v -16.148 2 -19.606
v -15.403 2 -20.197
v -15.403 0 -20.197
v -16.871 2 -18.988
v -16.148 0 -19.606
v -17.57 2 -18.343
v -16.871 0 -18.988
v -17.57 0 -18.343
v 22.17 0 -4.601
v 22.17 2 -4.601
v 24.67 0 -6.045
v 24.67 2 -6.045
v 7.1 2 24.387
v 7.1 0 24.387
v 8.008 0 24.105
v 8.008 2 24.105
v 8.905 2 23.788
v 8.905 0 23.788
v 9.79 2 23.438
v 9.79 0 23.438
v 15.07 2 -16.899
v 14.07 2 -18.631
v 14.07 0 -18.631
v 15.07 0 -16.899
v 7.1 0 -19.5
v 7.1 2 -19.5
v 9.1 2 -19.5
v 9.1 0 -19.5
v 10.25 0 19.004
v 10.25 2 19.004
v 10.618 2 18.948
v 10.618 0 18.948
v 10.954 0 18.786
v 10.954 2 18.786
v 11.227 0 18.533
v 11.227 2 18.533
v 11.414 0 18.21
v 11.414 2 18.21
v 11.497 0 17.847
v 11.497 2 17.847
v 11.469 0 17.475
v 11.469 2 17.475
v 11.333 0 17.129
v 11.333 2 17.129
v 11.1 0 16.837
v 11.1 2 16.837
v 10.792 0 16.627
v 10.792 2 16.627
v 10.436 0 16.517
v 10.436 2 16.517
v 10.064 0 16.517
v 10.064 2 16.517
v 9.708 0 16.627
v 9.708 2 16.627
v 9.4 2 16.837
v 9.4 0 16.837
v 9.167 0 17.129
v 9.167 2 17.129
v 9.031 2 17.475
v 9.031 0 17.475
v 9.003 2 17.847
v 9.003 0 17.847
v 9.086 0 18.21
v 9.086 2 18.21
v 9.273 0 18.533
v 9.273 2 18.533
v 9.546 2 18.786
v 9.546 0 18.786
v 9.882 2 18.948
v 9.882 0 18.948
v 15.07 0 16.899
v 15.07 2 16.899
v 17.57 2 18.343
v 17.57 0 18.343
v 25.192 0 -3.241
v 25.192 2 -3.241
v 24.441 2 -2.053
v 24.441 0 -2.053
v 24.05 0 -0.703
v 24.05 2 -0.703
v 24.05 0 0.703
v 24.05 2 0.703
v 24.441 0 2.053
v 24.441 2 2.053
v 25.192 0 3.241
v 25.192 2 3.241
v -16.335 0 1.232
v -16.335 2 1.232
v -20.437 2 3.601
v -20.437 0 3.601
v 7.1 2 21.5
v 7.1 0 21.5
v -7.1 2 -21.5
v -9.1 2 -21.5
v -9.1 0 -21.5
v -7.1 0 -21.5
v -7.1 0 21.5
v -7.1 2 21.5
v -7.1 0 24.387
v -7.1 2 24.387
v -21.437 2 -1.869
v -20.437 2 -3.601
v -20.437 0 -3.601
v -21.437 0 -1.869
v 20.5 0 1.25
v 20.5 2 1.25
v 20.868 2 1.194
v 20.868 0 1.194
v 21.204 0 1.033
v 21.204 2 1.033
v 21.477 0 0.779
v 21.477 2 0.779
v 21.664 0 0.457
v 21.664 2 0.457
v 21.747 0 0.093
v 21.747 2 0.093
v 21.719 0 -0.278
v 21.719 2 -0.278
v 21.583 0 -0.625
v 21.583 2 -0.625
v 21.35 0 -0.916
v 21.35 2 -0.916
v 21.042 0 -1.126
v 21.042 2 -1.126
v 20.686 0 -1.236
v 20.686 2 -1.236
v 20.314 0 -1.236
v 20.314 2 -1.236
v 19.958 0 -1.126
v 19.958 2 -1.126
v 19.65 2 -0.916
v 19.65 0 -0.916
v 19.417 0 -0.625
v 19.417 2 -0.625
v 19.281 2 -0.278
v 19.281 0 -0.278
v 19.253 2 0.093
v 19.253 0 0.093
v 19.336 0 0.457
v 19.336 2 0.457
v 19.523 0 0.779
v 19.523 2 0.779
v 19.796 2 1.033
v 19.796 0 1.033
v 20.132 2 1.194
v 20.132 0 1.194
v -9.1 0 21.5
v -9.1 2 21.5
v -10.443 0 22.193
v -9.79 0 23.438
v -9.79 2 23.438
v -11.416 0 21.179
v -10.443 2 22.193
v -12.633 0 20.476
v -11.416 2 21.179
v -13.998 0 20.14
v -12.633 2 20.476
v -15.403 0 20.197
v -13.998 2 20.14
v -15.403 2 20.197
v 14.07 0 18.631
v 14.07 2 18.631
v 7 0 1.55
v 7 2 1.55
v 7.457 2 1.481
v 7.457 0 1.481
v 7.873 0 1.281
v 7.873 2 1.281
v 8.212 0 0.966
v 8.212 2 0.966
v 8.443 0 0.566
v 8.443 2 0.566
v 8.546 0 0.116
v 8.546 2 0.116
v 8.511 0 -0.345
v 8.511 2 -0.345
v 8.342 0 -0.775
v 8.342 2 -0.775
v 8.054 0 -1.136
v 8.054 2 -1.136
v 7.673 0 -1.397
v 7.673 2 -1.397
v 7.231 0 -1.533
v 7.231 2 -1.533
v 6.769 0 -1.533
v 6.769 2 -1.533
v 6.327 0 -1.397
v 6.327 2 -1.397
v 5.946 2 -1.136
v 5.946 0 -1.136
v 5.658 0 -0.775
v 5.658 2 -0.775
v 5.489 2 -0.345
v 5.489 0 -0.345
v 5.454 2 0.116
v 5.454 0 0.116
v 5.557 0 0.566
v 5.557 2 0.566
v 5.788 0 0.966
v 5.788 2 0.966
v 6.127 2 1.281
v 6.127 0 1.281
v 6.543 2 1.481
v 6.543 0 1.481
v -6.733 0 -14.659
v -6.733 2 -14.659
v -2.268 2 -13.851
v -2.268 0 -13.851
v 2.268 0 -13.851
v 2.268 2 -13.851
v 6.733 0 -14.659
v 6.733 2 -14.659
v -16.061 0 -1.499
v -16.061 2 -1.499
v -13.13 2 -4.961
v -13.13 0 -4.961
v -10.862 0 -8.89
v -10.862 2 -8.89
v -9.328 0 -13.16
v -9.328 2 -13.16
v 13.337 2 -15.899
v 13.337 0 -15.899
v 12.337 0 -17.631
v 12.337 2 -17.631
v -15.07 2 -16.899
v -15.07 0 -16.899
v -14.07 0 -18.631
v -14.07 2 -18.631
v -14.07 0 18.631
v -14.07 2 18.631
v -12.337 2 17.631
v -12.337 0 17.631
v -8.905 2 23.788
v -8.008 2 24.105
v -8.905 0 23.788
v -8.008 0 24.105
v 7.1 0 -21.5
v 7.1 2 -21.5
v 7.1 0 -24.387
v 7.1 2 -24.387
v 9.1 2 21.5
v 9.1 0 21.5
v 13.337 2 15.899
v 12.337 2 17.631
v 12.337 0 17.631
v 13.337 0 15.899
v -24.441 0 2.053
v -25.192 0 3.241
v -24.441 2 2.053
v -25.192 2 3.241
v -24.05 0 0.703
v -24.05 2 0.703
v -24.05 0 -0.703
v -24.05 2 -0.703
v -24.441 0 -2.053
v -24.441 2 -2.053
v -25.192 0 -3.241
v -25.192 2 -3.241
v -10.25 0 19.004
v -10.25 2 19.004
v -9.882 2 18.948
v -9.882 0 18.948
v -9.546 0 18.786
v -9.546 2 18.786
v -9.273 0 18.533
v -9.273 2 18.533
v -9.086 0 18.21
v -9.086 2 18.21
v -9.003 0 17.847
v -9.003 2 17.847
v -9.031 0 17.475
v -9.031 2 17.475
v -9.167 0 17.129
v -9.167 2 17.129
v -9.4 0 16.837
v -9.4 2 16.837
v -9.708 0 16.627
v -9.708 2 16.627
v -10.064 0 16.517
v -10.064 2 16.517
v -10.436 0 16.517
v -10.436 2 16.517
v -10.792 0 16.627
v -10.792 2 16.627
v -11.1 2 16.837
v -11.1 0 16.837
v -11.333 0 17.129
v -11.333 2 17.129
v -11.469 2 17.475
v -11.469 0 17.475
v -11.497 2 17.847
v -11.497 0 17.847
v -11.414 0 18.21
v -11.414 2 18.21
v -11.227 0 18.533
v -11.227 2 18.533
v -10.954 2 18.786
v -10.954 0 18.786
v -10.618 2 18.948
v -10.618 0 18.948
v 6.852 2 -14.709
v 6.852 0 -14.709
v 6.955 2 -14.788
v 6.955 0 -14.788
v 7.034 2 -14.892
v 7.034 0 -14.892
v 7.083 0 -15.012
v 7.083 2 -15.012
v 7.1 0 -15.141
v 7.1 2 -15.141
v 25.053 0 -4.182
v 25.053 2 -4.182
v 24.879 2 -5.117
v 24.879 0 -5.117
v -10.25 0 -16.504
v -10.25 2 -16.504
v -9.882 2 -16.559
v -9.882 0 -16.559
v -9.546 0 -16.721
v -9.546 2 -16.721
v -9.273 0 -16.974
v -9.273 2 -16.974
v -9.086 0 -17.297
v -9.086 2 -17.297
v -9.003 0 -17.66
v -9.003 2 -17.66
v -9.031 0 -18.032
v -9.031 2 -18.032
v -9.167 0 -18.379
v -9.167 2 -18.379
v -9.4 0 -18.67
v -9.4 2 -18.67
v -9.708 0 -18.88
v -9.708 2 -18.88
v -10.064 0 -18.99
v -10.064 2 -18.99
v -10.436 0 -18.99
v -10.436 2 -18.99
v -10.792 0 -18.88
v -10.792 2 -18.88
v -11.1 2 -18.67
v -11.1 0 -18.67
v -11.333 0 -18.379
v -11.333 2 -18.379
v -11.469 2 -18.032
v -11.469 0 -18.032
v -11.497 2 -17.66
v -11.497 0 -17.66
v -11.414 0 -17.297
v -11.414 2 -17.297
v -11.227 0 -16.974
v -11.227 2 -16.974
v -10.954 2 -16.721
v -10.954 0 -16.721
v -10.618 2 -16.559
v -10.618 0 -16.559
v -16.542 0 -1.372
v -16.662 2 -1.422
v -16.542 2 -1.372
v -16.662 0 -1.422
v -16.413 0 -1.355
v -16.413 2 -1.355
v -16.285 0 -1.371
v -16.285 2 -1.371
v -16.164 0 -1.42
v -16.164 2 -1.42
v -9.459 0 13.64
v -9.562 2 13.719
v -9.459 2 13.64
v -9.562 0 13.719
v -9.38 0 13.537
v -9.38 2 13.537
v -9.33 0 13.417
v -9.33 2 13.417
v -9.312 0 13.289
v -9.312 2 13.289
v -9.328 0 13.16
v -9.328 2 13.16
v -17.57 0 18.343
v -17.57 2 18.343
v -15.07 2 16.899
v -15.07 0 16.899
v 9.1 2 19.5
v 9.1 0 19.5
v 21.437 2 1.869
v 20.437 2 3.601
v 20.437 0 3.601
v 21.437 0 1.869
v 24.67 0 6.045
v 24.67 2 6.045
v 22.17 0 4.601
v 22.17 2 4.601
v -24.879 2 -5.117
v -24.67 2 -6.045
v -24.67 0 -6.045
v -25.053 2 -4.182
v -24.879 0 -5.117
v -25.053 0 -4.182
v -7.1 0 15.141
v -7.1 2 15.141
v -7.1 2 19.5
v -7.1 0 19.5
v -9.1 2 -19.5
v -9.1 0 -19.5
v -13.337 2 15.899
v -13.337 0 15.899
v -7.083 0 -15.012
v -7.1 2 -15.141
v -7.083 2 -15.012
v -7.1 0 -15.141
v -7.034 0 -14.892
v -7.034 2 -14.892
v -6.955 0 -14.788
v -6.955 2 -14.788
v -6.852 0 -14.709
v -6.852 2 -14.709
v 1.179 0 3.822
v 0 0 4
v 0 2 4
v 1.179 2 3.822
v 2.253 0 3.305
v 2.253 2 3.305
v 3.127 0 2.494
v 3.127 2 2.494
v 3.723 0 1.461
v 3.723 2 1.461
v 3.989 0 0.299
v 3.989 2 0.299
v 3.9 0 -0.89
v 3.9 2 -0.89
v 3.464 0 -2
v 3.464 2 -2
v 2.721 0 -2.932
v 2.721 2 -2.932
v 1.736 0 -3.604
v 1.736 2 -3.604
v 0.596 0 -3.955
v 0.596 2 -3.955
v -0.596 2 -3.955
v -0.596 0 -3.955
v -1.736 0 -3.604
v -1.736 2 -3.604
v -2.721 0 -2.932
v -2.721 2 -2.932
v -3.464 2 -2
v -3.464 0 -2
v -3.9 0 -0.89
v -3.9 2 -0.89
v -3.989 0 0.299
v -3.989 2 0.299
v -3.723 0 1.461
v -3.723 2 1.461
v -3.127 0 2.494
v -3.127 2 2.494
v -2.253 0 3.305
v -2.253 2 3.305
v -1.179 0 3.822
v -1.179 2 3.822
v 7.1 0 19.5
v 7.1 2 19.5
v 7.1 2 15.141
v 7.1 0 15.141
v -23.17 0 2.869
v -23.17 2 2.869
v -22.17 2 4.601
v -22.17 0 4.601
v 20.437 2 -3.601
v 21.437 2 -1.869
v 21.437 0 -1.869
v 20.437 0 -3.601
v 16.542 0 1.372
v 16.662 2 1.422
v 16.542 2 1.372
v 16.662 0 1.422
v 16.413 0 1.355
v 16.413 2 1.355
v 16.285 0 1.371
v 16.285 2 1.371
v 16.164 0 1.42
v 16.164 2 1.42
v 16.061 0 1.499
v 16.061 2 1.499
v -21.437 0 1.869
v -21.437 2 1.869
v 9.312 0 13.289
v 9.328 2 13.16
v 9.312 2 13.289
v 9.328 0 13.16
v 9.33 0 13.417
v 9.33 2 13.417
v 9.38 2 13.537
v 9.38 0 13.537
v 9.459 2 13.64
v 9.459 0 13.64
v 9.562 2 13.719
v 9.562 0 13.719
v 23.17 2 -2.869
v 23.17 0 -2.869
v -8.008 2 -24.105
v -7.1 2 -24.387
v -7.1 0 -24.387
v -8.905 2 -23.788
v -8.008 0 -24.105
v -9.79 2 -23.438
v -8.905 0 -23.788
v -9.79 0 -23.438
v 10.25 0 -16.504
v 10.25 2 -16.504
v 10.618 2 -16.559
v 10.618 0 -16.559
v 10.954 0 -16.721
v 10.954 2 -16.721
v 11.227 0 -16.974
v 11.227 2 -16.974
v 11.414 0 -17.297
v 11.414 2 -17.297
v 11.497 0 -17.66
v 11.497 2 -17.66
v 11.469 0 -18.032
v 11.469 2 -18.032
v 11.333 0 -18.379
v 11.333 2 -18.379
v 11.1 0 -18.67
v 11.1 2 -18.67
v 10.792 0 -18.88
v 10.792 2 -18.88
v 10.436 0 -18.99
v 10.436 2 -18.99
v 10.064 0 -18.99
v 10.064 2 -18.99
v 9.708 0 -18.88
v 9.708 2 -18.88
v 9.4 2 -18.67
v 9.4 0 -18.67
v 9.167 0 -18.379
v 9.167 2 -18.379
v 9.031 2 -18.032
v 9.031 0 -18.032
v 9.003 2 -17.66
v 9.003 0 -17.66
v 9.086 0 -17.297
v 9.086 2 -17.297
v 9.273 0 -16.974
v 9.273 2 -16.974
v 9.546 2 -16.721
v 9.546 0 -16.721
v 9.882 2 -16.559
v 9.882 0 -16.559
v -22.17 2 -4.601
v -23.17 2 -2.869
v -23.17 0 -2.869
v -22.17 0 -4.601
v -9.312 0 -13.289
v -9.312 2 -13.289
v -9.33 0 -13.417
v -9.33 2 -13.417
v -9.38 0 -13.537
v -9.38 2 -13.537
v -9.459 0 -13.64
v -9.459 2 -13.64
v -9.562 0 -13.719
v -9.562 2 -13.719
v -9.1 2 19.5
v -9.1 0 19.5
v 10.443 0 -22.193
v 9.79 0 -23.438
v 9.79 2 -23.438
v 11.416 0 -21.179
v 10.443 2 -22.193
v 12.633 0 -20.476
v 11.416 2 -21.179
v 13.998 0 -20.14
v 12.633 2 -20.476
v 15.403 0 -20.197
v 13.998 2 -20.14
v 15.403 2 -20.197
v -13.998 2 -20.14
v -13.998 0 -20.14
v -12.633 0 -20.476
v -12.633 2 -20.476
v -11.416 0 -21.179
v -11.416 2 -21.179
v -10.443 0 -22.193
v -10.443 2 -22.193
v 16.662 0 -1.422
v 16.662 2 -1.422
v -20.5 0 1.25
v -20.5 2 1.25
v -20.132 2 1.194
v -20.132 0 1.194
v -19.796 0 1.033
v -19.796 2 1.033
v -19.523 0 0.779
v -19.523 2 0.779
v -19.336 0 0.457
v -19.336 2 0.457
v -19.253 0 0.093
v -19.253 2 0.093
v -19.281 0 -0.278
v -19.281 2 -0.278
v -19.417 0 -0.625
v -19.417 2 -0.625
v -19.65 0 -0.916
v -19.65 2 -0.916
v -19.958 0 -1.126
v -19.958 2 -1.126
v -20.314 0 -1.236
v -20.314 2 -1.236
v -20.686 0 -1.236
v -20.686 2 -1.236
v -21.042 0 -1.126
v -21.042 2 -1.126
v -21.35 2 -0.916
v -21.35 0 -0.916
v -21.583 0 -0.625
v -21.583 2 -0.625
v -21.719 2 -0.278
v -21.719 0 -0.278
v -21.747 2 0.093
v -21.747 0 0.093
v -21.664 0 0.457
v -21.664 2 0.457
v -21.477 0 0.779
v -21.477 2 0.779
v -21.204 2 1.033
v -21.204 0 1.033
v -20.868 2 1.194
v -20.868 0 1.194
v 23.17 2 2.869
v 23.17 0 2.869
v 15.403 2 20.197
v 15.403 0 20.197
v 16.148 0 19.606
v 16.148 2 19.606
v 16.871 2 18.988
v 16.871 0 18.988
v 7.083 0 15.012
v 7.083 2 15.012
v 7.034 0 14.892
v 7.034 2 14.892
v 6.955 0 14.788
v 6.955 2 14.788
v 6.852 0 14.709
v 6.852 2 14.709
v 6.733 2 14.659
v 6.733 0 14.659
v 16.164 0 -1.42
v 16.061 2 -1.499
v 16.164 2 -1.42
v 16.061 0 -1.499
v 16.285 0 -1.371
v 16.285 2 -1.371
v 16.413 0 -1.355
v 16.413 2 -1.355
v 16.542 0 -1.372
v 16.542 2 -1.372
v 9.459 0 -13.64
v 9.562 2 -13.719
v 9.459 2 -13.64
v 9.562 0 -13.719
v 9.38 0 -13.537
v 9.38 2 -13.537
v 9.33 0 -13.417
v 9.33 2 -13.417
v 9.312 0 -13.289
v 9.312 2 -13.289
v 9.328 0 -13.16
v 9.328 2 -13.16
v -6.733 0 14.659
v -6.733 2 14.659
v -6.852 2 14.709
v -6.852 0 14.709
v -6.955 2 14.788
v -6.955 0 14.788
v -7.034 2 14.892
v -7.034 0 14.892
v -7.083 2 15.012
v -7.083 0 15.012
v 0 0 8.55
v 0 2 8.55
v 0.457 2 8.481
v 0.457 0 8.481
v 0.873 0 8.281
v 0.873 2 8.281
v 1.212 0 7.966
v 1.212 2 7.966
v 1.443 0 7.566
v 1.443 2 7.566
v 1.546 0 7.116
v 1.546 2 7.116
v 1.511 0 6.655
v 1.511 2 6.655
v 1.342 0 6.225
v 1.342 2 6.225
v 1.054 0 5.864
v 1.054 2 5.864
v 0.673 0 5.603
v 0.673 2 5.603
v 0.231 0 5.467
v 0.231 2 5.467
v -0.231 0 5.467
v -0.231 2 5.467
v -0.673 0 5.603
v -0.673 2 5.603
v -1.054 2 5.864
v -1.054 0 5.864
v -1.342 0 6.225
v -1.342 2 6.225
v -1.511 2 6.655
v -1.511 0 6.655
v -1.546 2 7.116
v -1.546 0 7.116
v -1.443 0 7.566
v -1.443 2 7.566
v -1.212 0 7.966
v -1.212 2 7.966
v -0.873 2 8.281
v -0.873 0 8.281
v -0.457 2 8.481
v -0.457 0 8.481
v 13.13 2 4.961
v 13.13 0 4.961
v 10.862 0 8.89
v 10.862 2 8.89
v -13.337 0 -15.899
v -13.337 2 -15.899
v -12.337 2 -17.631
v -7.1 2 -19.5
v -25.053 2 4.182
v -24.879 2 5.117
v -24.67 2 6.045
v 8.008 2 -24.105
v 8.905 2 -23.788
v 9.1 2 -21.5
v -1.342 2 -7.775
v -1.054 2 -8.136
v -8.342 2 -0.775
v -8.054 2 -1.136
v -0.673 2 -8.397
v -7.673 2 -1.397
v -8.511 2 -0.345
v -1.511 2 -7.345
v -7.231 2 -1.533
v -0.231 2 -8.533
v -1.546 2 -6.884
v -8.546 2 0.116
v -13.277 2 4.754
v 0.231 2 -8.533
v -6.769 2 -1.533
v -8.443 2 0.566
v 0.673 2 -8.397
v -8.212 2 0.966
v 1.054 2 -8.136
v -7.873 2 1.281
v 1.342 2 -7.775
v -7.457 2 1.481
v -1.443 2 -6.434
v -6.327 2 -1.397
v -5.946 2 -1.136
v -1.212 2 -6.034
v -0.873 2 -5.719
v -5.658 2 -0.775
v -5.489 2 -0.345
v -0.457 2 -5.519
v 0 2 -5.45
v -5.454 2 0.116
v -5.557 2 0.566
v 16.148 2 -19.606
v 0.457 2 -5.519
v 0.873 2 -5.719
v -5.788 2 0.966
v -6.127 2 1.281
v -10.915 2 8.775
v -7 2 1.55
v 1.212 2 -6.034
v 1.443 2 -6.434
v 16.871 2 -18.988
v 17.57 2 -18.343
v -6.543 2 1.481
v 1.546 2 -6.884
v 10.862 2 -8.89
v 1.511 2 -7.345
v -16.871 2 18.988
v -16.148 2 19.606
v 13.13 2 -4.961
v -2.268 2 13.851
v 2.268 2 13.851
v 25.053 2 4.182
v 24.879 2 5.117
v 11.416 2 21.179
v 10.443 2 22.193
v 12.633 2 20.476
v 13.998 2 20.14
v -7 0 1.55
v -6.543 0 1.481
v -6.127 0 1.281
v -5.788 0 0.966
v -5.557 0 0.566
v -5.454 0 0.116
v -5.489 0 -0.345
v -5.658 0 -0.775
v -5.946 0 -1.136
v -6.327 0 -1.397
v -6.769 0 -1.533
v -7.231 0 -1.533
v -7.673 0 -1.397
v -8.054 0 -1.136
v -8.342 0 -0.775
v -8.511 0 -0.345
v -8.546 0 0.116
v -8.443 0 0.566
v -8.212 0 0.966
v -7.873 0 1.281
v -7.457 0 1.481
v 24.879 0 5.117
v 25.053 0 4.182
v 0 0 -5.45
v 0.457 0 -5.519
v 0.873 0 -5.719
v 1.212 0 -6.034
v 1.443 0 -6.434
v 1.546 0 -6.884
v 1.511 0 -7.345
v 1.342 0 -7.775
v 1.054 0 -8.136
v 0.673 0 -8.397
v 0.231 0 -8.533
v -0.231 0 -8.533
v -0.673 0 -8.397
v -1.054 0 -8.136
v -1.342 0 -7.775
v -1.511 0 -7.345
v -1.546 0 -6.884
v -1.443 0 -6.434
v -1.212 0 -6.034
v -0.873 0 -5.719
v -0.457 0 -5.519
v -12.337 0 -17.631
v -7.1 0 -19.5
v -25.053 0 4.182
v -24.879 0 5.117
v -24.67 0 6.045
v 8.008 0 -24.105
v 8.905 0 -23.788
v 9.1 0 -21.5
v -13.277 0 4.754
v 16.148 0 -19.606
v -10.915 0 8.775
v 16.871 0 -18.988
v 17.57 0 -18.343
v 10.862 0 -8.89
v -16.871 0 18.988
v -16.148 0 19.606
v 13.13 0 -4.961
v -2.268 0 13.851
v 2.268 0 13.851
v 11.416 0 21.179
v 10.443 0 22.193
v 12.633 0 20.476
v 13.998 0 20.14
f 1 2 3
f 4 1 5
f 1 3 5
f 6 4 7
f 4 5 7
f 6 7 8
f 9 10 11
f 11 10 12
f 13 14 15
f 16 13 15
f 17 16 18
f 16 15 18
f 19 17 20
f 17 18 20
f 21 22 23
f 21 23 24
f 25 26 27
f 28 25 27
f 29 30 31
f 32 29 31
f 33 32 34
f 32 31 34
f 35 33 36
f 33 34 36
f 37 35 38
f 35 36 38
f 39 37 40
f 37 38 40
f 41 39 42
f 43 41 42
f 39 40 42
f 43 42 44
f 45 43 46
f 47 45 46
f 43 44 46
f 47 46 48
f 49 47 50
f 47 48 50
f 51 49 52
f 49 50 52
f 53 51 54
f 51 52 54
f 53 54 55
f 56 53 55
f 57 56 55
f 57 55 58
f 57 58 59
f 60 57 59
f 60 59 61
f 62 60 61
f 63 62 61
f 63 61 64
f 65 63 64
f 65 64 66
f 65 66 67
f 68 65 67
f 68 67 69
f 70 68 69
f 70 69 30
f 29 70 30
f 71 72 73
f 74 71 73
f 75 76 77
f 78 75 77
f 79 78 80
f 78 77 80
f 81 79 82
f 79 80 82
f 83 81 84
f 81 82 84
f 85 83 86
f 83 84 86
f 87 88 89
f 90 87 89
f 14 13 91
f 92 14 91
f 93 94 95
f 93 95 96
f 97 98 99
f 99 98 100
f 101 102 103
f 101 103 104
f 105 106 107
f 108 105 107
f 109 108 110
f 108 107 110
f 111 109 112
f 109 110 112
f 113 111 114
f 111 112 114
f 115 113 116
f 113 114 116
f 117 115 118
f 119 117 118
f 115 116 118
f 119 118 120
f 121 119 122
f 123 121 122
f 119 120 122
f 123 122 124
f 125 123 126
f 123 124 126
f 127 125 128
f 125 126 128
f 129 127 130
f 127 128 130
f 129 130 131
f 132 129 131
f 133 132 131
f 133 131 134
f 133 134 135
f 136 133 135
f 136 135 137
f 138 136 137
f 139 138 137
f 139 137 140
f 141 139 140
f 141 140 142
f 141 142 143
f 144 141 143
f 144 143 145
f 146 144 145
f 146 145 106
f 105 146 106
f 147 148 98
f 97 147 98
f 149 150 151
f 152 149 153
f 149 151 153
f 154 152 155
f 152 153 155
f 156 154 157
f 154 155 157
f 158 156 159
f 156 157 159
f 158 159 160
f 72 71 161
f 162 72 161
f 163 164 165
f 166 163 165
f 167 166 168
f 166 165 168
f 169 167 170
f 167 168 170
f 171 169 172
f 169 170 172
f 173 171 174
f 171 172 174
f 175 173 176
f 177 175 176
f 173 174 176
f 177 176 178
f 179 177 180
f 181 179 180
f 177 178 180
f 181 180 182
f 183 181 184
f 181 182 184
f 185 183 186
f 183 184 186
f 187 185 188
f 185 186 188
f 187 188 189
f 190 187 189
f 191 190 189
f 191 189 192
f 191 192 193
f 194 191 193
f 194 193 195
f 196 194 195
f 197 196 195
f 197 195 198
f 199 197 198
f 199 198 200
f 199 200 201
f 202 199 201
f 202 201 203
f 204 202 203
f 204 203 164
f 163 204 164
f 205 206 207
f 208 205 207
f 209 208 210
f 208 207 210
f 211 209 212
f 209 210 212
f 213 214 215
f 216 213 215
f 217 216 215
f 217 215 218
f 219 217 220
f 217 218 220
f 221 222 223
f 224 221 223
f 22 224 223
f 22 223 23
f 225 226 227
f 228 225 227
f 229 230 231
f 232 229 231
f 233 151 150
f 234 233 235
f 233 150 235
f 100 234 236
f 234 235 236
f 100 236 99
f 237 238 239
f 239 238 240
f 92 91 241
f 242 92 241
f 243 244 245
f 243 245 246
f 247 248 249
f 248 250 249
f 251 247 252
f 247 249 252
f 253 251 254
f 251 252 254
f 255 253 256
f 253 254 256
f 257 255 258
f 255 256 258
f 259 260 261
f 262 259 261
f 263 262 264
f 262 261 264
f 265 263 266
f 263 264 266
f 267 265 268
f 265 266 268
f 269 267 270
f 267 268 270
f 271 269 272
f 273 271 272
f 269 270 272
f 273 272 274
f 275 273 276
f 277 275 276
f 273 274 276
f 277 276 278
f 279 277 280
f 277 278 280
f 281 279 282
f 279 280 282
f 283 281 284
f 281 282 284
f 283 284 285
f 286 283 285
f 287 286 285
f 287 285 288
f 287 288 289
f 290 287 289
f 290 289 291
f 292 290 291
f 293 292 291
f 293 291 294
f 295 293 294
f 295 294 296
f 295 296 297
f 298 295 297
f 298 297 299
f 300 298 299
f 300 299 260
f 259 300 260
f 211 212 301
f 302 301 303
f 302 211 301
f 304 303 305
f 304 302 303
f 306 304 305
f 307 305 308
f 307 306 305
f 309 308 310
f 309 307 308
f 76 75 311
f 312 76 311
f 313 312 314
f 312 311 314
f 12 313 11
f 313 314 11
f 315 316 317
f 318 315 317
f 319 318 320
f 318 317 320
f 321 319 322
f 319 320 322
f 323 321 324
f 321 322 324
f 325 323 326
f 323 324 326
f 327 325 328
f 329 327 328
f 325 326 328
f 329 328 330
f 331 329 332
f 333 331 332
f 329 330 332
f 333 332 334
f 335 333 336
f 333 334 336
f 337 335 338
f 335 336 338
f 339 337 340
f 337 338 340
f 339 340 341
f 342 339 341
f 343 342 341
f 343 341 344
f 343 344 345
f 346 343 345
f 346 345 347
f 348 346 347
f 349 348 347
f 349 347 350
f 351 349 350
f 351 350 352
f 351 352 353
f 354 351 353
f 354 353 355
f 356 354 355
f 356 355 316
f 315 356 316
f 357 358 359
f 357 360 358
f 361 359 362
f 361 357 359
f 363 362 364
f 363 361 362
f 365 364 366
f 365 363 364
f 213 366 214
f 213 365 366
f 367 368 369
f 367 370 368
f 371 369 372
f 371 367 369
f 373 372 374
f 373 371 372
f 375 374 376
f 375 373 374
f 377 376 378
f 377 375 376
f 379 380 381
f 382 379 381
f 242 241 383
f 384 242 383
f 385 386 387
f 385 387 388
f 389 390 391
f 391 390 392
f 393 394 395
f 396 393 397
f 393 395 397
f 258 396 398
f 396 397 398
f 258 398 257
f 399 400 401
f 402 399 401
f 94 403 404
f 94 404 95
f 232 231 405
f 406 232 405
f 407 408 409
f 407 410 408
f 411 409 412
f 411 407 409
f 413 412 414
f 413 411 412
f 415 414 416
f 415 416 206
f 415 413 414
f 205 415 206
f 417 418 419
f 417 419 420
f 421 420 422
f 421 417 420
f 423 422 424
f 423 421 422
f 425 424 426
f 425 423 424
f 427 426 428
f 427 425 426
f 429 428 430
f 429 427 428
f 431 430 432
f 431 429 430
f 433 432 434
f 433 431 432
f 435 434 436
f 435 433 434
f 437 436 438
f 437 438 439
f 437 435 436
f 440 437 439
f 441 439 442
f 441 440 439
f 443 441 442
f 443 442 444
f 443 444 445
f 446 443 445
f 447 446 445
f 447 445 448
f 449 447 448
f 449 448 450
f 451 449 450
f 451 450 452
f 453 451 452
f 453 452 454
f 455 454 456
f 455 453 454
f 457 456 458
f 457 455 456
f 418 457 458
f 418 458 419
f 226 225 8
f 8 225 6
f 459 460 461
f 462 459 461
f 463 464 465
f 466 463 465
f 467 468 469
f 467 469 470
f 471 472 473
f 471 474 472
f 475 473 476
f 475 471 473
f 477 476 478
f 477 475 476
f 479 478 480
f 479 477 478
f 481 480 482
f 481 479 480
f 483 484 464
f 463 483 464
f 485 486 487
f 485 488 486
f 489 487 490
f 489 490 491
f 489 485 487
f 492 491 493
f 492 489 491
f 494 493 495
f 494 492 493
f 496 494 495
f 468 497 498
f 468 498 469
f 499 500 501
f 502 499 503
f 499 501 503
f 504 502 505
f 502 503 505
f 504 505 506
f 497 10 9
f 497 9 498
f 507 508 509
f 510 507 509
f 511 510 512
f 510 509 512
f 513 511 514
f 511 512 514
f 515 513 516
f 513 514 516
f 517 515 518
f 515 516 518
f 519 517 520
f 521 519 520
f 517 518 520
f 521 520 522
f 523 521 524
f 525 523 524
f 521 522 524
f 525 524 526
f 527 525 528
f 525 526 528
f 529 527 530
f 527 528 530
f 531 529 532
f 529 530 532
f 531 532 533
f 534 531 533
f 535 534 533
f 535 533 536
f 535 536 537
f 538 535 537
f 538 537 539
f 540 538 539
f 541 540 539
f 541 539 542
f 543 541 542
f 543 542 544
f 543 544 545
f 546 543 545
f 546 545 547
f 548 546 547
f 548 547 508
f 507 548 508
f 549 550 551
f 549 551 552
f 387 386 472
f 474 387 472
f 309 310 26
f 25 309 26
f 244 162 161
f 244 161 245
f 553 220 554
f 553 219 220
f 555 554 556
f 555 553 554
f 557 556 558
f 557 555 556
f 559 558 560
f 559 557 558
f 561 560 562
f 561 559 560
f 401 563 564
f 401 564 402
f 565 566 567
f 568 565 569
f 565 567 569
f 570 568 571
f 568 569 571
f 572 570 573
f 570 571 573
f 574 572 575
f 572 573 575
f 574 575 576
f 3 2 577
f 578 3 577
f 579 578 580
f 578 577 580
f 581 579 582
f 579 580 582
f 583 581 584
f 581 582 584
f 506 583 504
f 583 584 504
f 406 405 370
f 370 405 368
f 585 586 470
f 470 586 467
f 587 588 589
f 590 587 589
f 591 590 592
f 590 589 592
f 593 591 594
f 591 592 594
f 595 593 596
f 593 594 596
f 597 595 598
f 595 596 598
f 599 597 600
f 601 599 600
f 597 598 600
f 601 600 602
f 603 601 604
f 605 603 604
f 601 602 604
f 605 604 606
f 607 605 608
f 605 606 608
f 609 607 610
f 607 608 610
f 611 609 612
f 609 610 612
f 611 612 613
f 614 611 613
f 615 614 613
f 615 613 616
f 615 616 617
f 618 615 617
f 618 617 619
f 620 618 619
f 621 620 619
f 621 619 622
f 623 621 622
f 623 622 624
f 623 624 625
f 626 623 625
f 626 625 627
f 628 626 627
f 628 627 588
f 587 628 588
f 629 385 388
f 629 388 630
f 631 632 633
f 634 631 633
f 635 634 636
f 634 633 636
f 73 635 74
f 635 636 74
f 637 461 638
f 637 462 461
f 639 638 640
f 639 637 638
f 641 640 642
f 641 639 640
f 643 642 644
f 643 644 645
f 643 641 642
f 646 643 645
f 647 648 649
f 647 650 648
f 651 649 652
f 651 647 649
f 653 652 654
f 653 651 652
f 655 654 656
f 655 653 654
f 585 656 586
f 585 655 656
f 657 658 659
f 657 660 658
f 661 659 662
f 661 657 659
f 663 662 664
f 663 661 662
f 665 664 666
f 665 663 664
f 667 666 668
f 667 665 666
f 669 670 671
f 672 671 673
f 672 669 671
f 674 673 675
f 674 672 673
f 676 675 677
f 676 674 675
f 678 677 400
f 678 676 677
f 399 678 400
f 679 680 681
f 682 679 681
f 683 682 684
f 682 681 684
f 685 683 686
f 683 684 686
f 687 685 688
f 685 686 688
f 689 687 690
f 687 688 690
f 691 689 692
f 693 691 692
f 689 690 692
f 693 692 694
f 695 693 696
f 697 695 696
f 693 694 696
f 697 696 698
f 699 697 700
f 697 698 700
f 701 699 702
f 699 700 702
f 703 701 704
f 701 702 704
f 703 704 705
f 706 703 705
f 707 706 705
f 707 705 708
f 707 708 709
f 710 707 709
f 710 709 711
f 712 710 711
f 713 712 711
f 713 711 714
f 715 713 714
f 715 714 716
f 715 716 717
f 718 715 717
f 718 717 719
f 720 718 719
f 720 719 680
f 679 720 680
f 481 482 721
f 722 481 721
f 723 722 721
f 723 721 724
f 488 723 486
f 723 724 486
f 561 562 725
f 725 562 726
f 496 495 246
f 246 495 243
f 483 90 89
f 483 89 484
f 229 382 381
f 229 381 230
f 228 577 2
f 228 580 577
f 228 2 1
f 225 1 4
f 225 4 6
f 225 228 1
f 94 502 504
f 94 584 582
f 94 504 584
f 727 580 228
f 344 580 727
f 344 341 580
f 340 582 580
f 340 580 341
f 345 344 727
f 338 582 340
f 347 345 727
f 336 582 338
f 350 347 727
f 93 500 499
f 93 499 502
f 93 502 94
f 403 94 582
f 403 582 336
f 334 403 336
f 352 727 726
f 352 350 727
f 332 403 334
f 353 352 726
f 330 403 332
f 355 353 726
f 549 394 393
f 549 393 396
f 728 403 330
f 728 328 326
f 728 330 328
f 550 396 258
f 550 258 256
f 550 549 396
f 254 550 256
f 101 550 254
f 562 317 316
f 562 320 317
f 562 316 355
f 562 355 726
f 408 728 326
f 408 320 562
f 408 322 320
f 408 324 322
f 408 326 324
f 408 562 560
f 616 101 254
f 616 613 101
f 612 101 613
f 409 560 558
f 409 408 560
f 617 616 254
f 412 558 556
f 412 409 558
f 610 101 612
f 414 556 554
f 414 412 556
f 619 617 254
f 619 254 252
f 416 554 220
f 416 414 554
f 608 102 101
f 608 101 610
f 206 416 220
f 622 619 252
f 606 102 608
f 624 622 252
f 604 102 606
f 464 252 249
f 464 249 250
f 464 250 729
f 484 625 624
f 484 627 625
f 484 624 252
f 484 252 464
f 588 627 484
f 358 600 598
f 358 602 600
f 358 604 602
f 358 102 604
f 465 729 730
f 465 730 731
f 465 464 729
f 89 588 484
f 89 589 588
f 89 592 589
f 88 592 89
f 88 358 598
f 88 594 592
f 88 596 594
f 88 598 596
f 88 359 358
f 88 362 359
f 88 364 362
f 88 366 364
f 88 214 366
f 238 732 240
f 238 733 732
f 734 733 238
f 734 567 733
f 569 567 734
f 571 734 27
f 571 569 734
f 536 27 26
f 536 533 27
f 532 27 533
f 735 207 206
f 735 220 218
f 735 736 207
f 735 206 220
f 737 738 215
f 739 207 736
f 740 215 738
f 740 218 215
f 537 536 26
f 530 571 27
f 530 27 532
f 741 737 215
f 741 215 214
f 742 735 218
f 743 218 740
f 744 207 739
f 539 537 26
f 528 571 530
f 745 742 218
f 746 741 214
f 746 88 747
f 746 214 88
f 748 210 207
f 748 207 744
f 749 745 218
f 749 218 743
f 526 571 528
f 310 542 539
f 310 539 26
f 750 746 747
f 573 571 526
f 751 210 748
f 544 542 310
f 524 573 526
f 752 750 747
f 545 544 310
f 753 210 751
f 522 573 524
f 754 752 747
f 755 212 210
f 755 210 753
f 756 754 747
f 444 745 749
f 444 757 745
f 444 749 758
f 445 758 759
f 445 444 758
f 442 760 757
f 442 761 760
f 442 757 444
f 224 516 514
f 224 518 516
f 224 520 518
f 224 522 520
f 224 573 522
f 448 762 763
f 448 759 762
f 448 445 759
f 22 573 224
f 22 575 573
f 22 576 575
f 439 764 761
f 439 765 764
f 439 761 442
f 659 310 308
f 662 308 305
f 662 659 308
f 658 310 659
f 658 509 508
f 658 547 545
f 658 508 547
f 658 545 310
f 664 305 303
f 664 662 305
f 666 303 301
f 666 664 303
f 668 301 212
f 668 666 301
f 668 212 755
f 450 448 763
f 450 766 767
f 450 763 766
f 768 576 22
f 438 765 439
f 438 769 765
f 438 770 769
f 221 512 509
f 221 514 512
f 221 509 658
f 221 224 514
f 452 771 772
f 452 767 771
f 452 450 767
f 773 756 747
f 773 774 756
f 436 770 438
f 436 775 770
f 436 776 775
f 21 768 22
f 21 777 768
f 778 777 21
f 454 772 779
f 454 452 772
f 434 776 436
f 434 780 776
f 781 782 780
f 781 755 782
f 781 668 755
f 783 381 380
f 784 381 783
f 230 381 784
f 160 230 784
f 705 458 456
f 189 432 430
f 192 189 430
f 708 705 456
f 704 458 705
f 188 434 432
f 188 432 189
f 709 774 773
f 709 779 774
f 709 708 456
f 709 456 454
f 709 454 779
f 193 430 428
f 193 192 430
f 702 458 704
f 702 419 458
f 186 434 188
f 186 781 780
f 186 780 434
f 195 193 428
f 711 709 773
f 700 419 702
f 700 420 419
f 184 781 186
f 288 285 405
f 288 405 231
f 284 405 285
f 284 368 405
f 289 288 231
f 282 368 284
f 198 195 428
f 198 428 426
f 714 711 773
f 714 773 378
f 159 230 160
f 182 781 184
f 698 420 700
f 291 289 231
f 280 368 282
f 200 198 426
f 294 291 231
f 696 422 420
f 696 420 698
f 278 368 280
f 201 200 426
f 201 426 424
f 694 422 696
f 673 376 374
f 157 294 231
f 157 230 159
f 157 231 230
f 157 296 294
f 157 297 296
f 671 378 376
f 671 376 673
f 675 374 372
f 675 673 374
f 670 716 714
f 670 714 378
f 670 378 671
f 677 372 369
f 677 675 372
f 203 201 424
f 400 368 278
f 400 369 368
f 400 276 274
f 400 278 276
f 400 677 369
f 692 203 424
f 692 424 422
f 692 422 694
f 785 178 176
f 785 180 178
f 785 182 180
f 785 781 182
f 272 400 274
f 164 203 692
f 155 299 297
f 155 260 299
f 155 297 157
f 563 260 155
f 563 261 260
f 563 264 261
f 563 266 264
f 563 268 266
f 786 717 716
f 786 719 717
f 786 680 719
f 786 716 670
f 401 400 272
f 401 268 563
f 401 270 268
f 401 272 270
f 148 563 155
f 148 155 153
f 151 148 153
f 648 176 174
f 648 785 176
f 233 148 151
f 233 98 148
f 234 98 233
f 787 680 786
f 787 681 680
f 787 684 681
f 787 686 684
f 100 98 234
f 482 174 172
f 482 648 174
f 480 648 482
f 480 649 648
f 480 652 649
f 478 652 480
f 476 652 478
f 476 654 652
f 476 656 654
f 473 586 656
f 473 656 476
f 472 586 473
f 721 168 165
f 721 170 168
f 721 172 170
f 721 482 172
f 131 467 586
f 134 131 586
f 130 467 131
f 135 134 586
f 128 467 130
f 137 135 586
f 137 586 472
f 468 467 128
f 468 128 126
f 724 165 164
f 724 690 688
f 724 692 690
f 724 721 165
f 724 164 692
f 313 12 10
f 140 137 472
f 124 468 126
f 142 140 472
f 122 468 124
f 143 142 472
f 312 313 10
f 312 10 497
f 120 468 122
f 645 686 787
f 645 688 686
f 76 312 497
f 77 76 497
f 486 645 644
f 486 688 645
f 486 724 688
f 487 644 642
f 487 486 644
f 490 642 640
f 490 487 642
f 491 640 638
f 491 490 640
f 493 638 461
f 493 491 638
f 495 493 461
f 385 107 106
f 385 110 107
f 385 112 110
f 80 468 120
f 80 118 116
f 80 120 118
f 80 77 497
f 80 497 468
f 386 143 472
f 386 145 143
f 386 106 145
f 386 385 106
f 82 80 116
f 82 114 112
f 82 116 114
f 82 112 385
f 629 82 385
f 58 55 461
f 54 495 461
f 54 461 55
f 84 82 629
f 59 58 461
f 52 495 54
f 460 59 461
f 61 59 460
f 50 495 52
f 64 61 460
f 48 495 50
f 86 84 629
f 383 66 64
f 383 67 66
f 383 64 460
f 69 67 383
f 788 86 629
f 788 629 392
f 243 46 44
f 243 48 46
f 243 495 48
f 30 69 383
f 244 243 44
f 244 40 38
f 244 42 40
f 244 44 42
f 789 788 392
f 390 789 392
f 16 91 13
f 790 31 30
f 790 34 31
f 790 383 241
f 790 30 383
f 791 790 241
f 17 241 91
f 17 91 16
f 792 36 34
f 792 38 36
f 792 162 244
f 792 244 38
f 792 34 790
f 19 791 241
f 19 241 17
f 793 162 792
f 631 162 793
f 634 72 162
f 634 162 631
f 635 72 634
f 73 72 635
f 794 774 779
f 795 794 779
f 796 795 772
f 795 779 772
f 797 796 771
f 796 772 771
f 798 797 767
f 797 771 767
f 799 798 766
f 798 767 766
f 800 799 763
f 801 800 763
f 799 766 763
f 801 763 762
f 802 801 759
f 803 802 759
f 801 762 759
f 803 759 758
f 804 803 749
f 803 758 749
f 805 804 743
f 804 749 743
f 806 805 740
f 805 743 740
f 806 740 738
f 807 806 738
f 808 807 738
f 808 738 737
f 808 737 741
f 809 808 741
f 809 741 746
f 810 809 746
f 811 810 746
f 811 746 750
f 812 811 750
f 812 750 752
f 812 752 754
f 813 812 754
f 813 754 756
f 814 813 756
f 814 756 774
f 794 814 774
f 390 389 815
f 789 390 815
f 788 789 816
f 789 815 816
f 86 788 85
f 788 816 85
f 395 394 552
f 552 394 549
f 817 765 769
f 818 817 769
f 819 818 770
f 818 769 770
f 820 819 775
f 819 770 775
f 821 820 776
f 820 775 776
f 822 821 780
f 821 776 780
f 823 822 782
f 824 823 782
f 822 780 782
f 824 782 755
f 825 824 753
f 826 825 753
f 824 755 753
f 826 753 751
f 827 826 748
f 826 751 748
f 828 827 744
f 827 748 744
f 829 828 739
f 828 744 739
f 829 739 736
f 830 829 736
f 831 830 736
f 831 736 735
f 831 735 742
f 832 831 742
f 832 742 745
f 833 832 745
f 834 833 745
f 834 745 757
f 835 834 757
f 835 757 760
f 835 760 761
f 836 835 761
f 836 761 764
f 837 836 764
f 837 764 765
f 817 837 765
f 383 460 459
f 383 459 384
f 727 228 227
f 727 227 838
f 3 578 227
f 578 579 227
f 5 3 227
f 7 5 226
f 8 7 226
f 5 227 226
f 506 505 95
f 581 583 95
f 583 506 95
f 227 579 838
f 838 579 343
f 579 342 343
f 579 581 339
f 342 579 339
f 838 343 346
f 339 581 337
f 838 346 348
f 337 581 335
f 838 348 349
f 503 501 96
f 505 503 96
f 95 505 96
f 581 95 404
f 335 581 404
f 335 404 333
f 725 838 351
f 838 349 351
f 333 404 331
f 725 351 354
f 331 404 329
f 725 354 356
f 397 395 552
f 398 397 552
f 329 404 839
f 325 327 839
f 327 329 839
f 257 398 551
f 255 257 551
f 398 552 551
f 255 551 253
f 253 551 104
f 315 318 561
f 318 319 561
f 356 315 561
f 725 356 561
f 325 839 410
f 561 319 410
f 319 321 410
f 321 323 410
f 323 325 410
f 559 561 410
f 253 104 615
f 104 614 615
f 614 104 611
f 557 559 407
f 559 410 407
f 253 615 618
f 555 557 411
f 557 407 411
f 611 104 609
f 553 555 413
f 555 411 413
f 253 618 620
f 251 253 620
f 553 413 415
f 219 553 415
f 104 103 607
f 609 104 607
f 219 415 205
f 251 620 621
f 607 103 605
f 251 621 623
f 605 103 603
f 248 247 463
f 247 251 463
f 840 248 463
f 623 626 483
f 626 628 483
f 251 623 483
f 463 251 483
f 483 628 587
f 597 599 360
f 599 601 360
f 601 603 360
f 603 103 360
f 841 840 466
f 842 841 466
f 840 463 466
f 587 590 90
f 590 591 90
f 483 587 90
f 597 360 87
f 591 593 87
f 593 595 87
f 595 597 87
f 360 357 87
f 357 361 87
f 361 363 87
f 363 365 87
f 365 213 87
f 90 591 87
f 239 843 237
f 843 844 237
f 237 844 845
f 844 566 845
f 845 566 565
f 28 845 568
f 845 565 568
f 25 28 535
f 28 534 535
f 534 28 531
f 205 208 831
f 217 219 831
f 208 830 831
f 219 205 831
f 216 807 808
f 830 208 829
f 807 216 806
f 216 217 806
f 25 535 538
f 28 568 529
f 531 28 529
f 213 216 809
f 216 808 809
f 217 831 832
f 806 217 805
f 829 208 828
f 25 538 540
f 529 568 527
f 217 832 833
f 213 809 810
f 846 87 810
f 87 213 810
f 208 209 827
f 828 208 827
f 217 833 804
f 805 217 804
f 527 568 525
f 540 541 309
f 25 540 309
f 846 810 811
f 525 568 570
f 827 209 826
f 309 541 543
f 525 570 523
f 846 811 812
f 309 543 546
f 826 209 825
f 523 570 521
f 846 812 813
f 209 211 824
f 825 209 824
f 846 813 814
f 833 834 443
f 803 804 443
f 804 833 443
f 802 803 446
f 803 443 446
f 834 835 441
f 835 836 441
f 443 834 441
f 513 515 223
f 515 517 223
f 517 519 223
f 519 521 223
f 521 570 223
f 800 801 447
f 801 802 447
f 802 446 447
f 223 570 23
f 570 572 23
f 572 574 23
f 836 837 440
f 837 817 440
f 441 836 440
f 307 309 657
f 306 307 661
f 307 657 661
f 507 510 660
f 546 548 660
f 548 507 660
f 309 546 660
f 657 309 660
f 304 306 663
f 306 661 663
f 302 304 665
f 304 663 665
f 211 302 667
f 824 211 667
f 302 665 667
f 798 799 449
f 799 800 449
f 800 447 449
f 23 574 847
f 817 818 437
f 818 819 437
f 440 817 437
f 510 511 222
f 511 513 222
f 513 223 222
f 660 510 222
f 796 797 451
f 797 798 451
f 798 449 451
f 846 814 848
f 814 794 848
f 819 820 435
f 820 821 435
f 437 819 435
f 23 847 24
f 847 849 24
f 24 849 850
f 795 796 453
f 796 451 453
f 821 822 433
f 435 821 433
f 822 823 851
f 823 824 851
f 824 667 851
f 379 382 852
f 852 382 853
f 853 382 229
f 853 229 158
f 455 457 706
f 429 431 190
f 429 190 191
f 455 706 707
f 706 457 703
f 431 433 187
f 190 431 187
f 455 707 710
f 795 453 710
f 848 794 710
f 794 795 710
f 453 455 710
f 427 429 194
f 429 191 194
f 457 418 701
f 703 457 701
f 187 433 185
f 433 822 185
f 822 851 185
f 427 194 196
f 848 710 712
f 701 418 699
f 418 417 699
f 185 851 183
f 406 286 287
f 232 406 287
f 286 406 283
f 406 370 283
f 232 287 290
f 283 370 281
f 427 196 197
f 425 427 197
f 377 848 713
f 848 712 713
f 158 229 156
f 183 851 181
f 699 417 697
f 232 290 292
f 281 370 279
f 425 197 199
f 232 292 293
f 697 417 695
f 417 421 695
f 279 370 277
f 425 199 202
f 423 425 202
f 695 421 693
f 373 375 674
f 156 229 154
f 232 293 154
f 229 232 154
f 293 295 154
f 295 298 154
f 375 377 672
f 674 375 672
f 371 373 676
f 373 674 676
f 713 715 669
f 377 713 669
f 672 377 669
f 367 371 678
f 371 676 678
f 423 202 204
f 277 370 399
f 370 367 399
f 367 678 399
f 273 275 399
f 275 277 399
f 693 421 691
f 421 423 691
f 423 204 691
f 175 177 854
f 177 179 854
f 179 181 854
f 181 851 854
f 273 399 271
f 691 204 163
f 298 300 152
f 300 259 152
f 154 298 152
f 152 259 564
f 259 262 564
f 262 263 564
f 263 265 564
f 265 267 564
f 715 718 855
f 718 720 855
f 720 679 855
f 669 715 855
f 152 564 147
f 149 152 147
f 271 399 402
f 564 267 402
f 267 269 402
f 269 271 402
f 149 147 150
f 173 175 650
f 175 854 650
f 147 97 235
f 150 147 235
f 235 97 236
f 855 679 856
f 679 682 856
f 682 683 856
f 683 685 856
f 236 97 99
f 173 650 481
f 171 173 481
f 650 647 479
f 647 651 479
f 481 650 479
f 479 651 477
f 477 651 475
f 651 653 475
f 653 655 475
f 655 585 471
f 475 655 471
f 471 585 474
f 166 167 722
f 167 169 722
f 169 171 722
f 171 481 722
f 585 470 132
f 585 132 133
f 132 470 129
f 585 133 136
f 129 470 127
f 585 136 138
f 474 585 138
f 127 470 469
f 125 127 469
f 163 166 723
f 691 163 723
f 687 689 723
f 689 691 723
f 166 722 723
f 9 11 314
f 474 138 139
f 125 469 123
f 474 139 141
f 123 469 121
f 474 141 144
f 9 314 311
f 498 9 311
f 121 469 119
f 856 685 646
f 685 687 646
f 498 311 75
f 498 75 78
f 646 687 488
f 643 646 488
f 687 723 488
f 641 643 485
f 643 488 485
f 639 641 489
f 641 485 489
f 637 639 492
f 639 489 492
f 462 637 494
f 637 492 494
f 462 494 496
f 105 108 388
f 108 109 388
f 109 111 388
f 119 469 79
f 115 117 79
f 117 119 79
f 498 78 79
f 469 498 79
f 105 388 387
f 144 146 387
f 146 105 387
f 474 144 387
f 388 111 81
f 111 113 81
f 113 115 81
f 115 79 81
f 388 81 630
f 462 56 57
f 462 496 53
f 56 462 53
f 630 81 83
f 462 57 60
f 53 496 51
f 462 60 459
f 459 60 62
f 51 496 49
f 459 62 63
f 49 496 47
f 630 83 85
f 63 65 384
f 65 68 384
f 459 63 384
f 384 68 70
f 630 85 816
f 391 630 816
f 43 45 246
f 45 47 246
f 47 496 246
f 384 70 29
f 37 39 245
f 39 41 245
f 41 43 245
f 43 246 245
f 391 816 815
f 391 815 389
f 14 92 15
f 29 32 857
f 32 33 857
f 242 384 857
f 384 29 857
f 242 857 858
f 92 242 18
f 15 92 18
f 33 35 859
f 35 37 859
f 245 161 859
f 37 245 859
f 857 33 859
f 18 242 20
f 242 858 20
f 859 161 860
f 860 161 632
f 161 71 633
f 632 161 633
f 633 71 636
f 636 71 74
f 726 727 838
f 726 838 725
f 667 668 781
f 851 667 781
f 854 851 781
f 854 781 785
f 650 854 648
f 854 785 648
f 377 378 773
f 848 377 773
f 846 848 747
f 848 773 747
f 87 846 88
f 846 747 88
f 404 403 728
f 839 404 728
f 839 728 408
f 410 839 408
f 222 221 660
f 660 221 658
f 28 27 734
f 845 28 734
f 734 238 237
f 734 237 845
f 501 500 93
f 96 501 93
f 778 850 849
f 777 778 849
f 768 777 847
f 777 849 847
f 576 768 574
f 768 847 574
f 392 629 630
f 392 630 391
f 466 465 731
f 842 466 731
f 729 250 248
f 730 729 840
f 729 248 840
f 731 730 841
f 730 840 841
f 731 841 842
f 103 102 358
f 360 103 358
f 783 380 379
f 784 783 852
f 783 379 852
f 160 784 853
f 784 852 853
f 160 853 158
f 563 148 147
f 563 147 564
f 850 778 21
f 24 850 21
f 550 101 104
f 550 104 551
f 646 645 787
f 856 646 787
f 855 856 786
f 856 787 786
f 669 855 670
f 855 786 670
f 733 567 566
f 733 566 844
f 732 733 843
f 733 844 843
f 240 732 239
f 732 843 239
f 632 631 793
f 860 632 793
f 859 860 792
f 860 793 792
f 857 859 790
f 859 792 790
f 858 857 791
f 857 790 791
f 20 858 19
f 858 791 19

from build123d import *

# Parameters (mm, degrees)
SKETCH_1_R          = 25.4
SKETCH_1_R_2        = 4
EXTRUDE_1_DEPTH     = 2
CUT_EXTRUDE_1_DEPTH = 36.9766591
SKETCH_3_R          = 1.25
SKETCH_3_R_2        = 5
CUT_EXTRUDE_2_DEPTH = 36.269108296
FILLET_1_R          = 0.5
SKETCH_4_R          = 1.55
CUT_EXTRUDE_3_DEPTH = 36.119904794
SKETCH_5_W          = 18.2
SKETCH_5_H          = 2
CUT_EXTRUDE_4_DEPTH = 2


with BuildPart() as part:
    # 草图1 → 凸台-拉伸1 (new body)
    with BuildSketch(Plane(origin=(0, 0, 0), x_dir=(1, 0, 0), z_dir=(0, 1, 0))):
        with Locations(Location((0, 0, 0), (0, 0, 270))):
            Circle(SKETCH_1_R)
        with Locations(Location((0, 0, 0), (0, 0, 270))):
            Circle(SKETCH_1_R_2, mode=Mode.SUBTRACT)
    extrude(amount=EXTRUDE_1_DEPTH)

    # 草图2 → 切除-拉伸1 (cut, through all)
    with BuildSketch(Plane(origin=(0, 2, 0), x_dir=(1, 0, 0), z_dir=(0, 1, 0))):
        with BuildLine():
            Line((-7.1, 24.387496797), (-7.1, 14.762503203))
            ThreePointArc((-7.1, 14.762503203), (0, 13.75), (7.1, 14.762503203))
            Line((7.1, 14.762503203), (7.1, 24.387496797))
            ThreePointArc((7.1, 24.387496797), (0, 25.4), (-7.1, 24.387496797))
        make_face()
        with BuildLine():
            Line((17.57019176, 18.342528765), (9.234702798, 13.530031969))
            ThreePointArc((9.234702798, 13.530031969), (11.907849302, 6.875), (16.334702798, 1.232471235))
            Line((16.334702798, 1.232471235), (24.67019176, 6.044968031))
            ThreePointArc((24.67019176, 6.044968031), (21.997045256, 12.7), (17.57019176, 18.342528765))
        make_face()
        with BuildLine():
            Line((24.67019176, -6.044968031), (16.334702798, -1.232471235))
            ThreePointArc((16.334702798, -1.232471235), (11.907849302, -6.875), (9.234702798, -13.530031969))
            Line((9.234702798, -13.530031969), (17.57019176, -18.342528765))
            ThreePointArc((17.57019176, -18.342528765), (21.997045256, -12.7), (24.67019176, -6.044968031))
        make_face()
        with BuildLine():
            Line((7.1, -24.387496797), (7.1, -14.762503203))
            ThreePointArc((7.1, -14.762503203), (0, -13.75), (-7.1, -14.762503203))
            Line((-7.1, -14.762503203), (-7.1, -24.387496797))
            ThreePointArc((-7.1, -24.387496797), (0, -25.4), (7.1, -24.387496797))
        make_face()
        with BuildLine():
            Line((-17.57019176, -18.342528765), (-9.234702798, -13.530031969))
            ThreePointArc((-9.234702798, -13.530031969), (-11.907849302, -6.875), (-16.334702798, -1.232471235))
            Line((-16.334702798, -1.232471235), (-24.67019176, -6.044968031))
            ThreePointArc((-24.67019176, -6.044968031), (-21.997045256, -12.7), (-17.57019176, -18.342528765))
        make_face()
        with BuildLine():
            Line((-24.67019176, 6.044968031), (-16.334702798, 1.232471235))
            ThreePointArc((-16.334702798, 1.232471235), (-11.907849302, 6.875), (-9.234702798, 13.530031969))
            Line((-9.234702798, 13.530031969), (-17.57019176, 18.342528765))
            ThreePointArc((-17.57019176, 18.342528765), (-21.997045256, 12.7), (-24.67019176, 6.044968031))
        make_face()
    extrude(amount=-CUT_EXTRUDE_1_DEPTH, mode=Mode.SUBTRACT)

    # 草图3 → 切除-拉伸2 (cut, through all)
    with BuildSketch(Plane(origin=(0, 2, 0), x_dir=(1, 0, 0), z_dir=(0, 1, 0))):
        with Locations(Location((-10.25, 17.753520778, 0), (0, 0, 270))):
            Circle(SKETCH_3_R)
        with Locations(Location((10.25, 17.753520778, 0), (0, 0, 270))):
            Circle(SKETCH_3_R)
        with Locations(Location((20.5, 0, 0), (0, 0, 270))):
            Circle(SKETCH_3_R)
        with Locations(Location((10.25, -17.753520778, 0), (0, 0, 270))):
            Circle(SKETCH_3_R)
        with Locations(Location((-10.25, -17.753520778, 0), (0, 0, 270))):
            Circle(SKETCH_3_R)
        with Locations(Location((-20.5, 0, 0), (0, 0, 270))):
            Circle(SKETCH_3_R)
        with Locations((-29, 0)):
            Circle(SKETCH_3_R_2)
        with Locations((-14.5, 25.11473671)):
            Circle(SKETCH_3_R_2)
        with Locations((14.5, 25.11473671)):
            Circle(SKETCH_3_R_2)
        with Locations((29, 0)):
            Circle(SKETCH_3_R_2)
        with Locations((14.5, -25.11473671)):
            Circle(SKETCH_3_R_2)
        with Locations((-14.5, -25.11473671)):
            Circle(SKETCH_3_R_2)
    extrude(amount=-CUT_EXTRUDE_2_DEPTH, mode=Mode.SUBTRACT)

    # 圆角1
    fillet_1_edges = [part.edges().sort_by_distance(p)[0] for p in [
        (16.334702798, 1, -1.232471235),
        (9.234702798, 1, -13.530031969),
        (9.234702798, 1, 13.530031969),
        (16.334702798, 1, 1.232471235),
        (-7.1, 1, 14.762503203),
        (7.1, 1, 14.762503203),
        (-9.234702798, 1, 13.530031969),
        (-9.234702798, 1, -13.530031969),
        (-16.334702798, 1, -1.232471235),
        (7.1, 1, -14.762503203),
        (-7.1, 1, -14.762503203),
    ]]
    fillet(fillet_1_edges, radius=FILLET_1_R)

    # 草图4 → 切除-拉伸3 (cut, through all)
    with BuildSketch(Plane(origin=(0, 2, 0), x_dir=(1, 0, 0), z_dir=(0, 1, 0))):
        with Locations(Location((-7, 0, 0), (0, 0, 270))):
            Circle(SKETCH_4_R)
        with Locations(Location((0, 7, 0), (0, 0, 270))):
            Circle(SKETCH_4_R)
        with Locations(Location((7, 0, 0), (0, 0, 270))):
            Circle(SKETCH_4_R)
        with Locations(Location((0, -7, 0), (0, 0, 270))):
            Circle(SKETCH_4_R)
    extrude(amount=-CUT_EXTRUDE_3_DEPTH, mode=Mode.SUBTRACT)

    # 草图5 → 切除-拉伸4 (cut)
    with BuildSketch(Plane(origin=(0, 2, 0), x_dir=(1, 0, 0), z_dir=(0, 1, 0))):
        Polygon((-12.337495374, -17.630831174), (-21.437495374, -1.869168826), (-23.169546181, -2.869168826), (-14.069546181, -18.630831174), align=None)
        Polygon((-14.069546181, 18.630831174), (-12.337495374, 17.630831174), (-21.437495374, 1.869168826), (-23.169546181, 2.869168826), align=None)
        with Locations((0, 20.5)):
            Rectangle(SKETCH_5_W, SKETCH_5_H)
        Polygon((23.169546181, 2.869168826), (21.437495374, 1.869168826), (12.337495374, 17.630831174), (14.069546181, 18.630831174), align=None)
        Polygon((14.069546181, -18.630831174), (12.337495374, -17.630831174), (21.437495374, -1.869168826), (23.169546181, -2.869168826), align=None)
        with Locations((0, -20.5)):
            Rectangle(SKETCH_5_W, SKETCH_5_H)
    extrude(amount=-CUT_EXTRUDE_4_DEPTH, mode=Mode.SUBTRACT)


solid = part.part
